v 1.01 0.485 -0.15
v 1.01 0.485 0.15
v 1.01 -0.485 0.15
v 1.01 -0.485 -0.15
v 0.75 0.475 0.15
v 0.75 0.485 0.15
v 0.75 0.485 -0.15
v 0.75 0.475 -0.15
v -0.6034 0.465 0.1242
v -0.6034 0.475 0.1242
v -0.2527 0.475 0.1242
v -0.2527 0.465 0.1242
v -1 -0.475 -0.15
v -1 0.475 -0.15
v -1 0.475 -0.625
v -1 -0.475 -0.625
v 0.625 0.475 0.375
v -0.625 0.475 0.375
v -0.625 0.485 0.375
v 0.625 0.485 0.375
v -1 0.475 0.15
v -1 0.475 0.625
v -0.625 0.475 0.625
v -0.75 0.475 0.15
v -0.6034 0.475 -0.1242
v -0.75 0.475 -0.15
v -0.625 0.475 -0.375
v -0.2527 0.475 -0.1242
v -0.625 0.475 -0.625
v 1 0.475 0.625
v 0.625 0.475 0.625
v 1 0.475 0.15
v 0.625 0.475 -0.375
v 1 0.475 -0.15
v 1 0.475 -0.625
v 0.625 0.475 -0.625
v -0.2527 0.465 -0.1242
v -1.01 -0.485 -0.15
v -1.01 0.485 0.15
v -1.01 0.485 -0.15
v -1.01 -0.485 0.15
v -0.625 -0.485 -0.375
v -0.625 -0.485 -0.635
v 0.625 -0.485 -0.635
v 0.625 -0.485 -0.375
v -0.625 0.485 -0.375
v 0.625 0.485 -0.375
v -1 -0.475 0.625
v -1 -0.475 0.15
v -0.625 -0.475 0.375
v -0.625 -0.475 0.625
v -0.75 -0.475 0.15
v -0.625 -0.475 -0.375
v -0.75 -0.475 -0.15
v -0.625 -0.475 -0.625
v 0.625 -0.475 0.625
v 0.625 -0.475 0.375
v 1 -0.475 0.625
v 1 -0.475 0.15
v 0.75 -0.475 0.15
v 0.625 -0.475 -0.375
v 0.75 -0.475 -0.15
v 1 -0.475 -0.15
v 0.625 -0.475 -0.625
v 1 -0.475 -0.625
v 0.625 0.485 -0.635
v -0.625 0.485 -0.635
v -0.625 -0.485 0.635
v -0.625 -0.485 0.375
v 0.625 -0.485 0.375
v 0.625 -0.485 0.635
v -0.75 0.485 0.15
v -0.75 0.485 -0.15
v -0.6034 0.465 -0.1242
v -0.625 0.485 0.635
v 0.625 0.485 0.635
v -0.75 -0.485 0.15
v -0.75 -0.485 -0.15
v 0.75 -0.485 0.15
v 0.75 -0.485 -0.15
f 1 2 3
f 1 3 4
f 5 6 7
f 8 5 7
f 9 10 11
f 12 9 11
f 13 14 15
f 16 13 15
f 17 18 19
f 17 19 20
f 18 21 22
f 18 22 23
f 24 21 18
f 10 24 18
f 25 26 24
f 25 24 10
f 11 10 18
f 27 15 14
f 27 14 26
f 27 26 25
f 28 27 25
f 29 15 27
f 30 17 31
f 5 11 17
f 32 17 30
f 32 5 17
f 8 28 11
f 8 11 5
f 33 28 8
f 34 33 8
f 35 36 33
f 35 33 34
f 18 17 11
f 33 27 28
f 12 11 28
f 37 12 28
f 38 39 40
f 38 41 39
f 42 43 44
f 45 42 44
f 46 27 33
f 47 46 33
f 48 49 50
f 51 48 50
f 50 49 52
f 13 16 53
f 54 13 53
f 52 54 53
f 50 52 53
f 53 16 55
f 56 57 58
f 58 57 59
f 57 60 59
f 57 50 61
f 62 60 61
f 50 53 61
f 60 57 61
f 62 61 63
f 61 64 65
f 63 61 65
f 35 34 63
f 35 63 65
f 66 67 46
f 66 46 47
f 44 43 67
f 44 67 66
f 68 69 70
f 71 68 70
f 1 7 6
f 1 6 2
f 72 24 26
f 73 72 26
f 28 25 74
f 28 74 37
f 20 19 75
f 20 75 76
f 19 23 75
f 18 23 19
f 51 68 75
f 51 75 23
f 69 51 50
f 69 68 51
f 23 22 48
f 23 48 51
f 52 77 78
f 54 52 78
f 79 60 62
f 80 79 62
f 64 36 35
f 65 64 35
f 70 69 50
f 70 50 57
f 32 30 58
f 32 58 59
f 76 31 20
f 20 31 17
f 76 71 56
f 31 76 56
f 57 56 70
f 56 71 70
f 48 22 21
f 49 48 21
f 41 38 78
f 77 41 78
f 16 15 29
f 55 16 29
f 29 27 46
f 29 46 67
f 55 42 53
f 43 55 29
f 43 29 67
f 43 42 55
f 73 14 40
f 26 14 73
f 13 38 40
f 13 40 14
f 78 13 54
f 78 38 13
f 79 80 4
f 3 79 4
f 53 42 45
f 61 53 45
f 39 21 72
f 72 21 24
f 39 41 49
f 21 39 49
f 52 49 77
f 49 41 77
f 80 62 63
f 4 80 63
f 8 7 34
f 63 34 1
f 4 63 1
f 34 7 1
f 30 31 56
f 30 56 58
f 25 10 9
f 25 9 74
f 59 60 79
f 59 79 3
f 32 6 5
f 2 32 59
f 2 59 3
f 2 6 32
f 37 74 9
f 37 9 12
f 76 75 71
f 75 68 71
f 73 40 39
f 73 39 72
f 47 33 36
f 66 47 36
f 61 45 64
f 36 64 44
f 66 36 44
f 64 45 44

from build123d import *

# Parameters (mm, degrees)
SKETCH1_W           = 2
SKETCH1_H           = 1.25
BOSS_EXTRUDE1_DEPTH = 0.475
SKETCH2_W           = 0.26
SKETCH2_H           = 0.3
SKETCH2_W_2         = 1.25
SKETCH2_H_2         = 0.26
BOSS_EXTRUDE2_DEPTH = 0.485
SKETCH3_W           = 0.350615202
SKETCH3_H           = 0.248352434
CUT_EXTRUDE1_DEPTH  = 0.01


with BuildPart() as part:
    # Sketch1 → Boss-Extrude1 (new body, symmetric)
    with BuildSketch(Plane(origin=(0, 0, 0), x_dir=(1, 0, 0), z_dir=(0, 1, 0))):
        Rectangle(SKETCH1_W, SKETCH1_H)
    extrude(amount=BOSS_EXTRUDE1_DEPTH, both=True)

    # Sketch2 → Boss-Extrude2 (add, symmetric)
    with BuildSketch(Plane(origin=(0, 0, 0), x_dir=(1, 0, 0), z_dir=(0, 1, 0))):
        with Locations((-0.88, 0)):
            Rectangle(SKETCH2_W, SKETCH2_H)
        with Locations((0, 0.505)):
            Rectangle(SKETCH2_W_2, SKETCH2_H_2)
        with Locations((0, -0.505)):
            Rectangle(SKETCH2_W_2, SKETCH2_H_2)
        with Locations((0.88, 0)):
            Rectangle(SKETCH2_W, SKETCH2_H)
    extrude(amount=BOSS_EXTRUDE2_DEPTH, both=True)

    # Sketch3 → Cut-Extrude1 (cut)
    with BuildSketch(Plane(origin=(0, 0.475, 0), x_dir=(1, 0, 0), z_dir=(0, 1, 0))):
        with Locations((-0.428042726, 0)):
            Rectangle(SKETCH3_W, SKETCH3_H)
    extrude(amount=-CUT_EXTRUDE1_DEPTH, mode=Mode.SUBTRACT)


solid = part.part
